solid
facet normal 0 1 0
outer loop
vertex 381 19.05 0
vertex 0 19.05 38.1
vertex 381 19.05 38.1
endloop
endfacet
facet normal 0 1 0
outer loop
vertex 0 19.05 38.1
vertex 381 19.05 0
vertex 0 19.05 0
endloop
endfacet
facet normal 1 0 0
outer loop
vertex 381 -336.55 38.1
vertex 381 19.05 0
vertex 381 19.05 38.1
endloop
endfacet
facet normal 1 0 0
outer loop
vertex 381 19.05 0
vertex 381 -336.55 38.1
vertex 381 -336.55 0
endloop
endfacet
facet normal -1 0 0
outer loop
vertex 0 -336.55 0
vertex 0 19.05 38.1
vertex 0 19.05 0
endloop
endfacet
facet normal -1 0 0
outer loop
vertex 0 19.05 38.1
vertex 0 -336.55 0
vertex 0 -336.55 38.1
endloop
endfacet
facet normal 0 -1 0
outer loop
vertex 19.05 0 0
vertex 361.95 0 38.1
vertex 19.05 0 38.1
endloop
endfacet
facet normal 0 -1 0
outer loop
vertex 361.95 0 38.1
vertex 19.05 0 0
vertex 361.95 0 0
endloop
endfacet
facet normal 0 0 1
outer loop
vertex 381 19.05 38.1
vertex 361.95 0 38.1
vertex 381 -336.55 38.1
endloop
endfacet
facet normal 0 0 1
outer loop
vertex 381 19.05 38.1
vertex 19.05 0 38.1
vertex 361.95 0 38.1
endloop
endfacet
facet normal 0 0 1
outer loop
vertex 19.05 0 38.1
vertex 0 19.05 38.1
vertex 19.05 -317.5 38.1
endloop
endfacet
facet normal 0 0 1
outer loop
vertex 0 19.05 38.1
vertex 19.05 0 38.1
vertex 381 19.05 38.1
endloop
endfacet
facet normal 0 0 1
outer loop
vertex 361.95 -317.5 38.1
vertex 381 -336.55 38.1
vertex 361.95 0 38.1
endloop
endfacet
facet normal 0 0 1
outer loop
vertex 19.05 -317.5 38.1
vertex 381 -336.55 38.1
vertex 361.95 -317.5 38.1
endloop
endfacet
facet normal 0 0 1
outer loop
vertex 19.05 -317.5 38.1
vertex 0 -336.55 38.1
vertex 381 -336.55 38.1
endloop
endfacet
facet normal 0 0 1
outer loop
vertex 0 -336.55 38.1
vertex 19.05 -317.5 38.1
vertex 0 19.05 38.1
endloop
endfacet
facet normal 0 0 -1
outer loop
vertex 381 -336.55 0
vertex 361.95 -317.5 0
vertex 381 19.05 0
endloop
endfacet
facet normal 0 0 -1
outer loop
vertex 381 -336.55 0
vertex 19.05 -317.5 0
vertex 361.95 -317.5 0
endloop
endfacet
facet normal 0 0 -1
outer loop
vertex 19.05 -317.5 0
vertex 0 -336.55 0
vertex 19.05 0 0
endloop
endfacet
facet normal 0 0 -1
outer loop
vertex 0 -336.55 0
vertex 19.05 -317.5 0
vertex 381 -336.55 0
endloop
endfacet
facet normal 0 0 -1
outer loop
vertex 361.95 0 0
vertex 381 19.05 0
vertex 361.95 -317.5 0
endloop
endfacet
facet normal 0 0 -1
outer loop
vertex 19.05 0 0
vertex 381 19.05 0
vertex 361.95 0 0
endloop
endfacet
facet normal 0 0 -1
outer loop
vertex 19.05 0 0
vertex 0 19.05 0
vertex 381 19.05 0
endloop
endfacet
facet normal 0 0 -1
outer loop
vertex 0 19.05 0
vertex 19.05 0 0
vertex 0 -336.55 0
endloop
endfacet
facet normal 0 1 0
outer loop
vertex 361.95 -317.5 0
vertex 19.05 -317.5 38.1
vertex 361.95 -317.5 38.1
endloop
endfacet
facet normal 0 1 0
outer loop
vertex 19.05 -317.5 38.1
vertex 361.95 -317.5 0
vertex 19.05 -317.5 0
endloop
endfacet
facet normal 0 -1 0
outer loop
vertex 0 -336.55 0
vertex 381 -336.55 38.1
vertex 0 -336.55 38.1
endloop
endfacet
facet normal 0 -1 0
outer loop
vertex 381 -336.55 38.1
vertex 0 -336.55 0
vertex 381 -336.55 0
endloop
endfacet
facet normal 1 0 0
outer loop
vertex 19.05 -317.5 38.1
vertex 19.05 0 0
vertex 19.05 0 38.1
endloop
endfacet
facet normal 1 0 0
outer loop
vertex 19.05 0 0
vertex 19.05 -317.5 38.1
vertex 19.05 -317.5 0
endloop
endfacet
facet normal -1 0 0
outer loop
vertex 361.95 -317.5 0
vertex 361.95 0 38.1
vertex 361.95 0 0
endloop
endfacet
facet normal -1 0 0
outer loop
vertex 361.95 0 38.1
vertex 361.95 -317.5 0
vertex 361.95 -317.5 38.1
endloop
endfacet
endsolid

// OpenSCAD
// file: modules/wood.scad
$fn = 10;
mmToIn = 25.4;
one    = 0.75 * mmToIn;
two    = 1.5  * mmToIn;
four   = 3.5  * mmToIn;

module 1x2(length){
     cube([one,two,length*mmToIn],0);
}
module 2x4(length){
     cube([two,four,length*mmToIn],0);
}
// main file
$fn    = 100;
include <./modules/wood.scad>;

length = 15;
width  = 12.5;
module frame(){
//Top
rotate([90,0,90])1x2(length);
//Bottom
translate([0,-1*width*mmToIn-one,0])rotate([90,0,90])1x2(length);
//Left
rotate([90,0,0])1x2(width);
//Right
translate([length*mmToIn-one,0,0])rotate([90,0,0])1x2(width);
}
frame();
